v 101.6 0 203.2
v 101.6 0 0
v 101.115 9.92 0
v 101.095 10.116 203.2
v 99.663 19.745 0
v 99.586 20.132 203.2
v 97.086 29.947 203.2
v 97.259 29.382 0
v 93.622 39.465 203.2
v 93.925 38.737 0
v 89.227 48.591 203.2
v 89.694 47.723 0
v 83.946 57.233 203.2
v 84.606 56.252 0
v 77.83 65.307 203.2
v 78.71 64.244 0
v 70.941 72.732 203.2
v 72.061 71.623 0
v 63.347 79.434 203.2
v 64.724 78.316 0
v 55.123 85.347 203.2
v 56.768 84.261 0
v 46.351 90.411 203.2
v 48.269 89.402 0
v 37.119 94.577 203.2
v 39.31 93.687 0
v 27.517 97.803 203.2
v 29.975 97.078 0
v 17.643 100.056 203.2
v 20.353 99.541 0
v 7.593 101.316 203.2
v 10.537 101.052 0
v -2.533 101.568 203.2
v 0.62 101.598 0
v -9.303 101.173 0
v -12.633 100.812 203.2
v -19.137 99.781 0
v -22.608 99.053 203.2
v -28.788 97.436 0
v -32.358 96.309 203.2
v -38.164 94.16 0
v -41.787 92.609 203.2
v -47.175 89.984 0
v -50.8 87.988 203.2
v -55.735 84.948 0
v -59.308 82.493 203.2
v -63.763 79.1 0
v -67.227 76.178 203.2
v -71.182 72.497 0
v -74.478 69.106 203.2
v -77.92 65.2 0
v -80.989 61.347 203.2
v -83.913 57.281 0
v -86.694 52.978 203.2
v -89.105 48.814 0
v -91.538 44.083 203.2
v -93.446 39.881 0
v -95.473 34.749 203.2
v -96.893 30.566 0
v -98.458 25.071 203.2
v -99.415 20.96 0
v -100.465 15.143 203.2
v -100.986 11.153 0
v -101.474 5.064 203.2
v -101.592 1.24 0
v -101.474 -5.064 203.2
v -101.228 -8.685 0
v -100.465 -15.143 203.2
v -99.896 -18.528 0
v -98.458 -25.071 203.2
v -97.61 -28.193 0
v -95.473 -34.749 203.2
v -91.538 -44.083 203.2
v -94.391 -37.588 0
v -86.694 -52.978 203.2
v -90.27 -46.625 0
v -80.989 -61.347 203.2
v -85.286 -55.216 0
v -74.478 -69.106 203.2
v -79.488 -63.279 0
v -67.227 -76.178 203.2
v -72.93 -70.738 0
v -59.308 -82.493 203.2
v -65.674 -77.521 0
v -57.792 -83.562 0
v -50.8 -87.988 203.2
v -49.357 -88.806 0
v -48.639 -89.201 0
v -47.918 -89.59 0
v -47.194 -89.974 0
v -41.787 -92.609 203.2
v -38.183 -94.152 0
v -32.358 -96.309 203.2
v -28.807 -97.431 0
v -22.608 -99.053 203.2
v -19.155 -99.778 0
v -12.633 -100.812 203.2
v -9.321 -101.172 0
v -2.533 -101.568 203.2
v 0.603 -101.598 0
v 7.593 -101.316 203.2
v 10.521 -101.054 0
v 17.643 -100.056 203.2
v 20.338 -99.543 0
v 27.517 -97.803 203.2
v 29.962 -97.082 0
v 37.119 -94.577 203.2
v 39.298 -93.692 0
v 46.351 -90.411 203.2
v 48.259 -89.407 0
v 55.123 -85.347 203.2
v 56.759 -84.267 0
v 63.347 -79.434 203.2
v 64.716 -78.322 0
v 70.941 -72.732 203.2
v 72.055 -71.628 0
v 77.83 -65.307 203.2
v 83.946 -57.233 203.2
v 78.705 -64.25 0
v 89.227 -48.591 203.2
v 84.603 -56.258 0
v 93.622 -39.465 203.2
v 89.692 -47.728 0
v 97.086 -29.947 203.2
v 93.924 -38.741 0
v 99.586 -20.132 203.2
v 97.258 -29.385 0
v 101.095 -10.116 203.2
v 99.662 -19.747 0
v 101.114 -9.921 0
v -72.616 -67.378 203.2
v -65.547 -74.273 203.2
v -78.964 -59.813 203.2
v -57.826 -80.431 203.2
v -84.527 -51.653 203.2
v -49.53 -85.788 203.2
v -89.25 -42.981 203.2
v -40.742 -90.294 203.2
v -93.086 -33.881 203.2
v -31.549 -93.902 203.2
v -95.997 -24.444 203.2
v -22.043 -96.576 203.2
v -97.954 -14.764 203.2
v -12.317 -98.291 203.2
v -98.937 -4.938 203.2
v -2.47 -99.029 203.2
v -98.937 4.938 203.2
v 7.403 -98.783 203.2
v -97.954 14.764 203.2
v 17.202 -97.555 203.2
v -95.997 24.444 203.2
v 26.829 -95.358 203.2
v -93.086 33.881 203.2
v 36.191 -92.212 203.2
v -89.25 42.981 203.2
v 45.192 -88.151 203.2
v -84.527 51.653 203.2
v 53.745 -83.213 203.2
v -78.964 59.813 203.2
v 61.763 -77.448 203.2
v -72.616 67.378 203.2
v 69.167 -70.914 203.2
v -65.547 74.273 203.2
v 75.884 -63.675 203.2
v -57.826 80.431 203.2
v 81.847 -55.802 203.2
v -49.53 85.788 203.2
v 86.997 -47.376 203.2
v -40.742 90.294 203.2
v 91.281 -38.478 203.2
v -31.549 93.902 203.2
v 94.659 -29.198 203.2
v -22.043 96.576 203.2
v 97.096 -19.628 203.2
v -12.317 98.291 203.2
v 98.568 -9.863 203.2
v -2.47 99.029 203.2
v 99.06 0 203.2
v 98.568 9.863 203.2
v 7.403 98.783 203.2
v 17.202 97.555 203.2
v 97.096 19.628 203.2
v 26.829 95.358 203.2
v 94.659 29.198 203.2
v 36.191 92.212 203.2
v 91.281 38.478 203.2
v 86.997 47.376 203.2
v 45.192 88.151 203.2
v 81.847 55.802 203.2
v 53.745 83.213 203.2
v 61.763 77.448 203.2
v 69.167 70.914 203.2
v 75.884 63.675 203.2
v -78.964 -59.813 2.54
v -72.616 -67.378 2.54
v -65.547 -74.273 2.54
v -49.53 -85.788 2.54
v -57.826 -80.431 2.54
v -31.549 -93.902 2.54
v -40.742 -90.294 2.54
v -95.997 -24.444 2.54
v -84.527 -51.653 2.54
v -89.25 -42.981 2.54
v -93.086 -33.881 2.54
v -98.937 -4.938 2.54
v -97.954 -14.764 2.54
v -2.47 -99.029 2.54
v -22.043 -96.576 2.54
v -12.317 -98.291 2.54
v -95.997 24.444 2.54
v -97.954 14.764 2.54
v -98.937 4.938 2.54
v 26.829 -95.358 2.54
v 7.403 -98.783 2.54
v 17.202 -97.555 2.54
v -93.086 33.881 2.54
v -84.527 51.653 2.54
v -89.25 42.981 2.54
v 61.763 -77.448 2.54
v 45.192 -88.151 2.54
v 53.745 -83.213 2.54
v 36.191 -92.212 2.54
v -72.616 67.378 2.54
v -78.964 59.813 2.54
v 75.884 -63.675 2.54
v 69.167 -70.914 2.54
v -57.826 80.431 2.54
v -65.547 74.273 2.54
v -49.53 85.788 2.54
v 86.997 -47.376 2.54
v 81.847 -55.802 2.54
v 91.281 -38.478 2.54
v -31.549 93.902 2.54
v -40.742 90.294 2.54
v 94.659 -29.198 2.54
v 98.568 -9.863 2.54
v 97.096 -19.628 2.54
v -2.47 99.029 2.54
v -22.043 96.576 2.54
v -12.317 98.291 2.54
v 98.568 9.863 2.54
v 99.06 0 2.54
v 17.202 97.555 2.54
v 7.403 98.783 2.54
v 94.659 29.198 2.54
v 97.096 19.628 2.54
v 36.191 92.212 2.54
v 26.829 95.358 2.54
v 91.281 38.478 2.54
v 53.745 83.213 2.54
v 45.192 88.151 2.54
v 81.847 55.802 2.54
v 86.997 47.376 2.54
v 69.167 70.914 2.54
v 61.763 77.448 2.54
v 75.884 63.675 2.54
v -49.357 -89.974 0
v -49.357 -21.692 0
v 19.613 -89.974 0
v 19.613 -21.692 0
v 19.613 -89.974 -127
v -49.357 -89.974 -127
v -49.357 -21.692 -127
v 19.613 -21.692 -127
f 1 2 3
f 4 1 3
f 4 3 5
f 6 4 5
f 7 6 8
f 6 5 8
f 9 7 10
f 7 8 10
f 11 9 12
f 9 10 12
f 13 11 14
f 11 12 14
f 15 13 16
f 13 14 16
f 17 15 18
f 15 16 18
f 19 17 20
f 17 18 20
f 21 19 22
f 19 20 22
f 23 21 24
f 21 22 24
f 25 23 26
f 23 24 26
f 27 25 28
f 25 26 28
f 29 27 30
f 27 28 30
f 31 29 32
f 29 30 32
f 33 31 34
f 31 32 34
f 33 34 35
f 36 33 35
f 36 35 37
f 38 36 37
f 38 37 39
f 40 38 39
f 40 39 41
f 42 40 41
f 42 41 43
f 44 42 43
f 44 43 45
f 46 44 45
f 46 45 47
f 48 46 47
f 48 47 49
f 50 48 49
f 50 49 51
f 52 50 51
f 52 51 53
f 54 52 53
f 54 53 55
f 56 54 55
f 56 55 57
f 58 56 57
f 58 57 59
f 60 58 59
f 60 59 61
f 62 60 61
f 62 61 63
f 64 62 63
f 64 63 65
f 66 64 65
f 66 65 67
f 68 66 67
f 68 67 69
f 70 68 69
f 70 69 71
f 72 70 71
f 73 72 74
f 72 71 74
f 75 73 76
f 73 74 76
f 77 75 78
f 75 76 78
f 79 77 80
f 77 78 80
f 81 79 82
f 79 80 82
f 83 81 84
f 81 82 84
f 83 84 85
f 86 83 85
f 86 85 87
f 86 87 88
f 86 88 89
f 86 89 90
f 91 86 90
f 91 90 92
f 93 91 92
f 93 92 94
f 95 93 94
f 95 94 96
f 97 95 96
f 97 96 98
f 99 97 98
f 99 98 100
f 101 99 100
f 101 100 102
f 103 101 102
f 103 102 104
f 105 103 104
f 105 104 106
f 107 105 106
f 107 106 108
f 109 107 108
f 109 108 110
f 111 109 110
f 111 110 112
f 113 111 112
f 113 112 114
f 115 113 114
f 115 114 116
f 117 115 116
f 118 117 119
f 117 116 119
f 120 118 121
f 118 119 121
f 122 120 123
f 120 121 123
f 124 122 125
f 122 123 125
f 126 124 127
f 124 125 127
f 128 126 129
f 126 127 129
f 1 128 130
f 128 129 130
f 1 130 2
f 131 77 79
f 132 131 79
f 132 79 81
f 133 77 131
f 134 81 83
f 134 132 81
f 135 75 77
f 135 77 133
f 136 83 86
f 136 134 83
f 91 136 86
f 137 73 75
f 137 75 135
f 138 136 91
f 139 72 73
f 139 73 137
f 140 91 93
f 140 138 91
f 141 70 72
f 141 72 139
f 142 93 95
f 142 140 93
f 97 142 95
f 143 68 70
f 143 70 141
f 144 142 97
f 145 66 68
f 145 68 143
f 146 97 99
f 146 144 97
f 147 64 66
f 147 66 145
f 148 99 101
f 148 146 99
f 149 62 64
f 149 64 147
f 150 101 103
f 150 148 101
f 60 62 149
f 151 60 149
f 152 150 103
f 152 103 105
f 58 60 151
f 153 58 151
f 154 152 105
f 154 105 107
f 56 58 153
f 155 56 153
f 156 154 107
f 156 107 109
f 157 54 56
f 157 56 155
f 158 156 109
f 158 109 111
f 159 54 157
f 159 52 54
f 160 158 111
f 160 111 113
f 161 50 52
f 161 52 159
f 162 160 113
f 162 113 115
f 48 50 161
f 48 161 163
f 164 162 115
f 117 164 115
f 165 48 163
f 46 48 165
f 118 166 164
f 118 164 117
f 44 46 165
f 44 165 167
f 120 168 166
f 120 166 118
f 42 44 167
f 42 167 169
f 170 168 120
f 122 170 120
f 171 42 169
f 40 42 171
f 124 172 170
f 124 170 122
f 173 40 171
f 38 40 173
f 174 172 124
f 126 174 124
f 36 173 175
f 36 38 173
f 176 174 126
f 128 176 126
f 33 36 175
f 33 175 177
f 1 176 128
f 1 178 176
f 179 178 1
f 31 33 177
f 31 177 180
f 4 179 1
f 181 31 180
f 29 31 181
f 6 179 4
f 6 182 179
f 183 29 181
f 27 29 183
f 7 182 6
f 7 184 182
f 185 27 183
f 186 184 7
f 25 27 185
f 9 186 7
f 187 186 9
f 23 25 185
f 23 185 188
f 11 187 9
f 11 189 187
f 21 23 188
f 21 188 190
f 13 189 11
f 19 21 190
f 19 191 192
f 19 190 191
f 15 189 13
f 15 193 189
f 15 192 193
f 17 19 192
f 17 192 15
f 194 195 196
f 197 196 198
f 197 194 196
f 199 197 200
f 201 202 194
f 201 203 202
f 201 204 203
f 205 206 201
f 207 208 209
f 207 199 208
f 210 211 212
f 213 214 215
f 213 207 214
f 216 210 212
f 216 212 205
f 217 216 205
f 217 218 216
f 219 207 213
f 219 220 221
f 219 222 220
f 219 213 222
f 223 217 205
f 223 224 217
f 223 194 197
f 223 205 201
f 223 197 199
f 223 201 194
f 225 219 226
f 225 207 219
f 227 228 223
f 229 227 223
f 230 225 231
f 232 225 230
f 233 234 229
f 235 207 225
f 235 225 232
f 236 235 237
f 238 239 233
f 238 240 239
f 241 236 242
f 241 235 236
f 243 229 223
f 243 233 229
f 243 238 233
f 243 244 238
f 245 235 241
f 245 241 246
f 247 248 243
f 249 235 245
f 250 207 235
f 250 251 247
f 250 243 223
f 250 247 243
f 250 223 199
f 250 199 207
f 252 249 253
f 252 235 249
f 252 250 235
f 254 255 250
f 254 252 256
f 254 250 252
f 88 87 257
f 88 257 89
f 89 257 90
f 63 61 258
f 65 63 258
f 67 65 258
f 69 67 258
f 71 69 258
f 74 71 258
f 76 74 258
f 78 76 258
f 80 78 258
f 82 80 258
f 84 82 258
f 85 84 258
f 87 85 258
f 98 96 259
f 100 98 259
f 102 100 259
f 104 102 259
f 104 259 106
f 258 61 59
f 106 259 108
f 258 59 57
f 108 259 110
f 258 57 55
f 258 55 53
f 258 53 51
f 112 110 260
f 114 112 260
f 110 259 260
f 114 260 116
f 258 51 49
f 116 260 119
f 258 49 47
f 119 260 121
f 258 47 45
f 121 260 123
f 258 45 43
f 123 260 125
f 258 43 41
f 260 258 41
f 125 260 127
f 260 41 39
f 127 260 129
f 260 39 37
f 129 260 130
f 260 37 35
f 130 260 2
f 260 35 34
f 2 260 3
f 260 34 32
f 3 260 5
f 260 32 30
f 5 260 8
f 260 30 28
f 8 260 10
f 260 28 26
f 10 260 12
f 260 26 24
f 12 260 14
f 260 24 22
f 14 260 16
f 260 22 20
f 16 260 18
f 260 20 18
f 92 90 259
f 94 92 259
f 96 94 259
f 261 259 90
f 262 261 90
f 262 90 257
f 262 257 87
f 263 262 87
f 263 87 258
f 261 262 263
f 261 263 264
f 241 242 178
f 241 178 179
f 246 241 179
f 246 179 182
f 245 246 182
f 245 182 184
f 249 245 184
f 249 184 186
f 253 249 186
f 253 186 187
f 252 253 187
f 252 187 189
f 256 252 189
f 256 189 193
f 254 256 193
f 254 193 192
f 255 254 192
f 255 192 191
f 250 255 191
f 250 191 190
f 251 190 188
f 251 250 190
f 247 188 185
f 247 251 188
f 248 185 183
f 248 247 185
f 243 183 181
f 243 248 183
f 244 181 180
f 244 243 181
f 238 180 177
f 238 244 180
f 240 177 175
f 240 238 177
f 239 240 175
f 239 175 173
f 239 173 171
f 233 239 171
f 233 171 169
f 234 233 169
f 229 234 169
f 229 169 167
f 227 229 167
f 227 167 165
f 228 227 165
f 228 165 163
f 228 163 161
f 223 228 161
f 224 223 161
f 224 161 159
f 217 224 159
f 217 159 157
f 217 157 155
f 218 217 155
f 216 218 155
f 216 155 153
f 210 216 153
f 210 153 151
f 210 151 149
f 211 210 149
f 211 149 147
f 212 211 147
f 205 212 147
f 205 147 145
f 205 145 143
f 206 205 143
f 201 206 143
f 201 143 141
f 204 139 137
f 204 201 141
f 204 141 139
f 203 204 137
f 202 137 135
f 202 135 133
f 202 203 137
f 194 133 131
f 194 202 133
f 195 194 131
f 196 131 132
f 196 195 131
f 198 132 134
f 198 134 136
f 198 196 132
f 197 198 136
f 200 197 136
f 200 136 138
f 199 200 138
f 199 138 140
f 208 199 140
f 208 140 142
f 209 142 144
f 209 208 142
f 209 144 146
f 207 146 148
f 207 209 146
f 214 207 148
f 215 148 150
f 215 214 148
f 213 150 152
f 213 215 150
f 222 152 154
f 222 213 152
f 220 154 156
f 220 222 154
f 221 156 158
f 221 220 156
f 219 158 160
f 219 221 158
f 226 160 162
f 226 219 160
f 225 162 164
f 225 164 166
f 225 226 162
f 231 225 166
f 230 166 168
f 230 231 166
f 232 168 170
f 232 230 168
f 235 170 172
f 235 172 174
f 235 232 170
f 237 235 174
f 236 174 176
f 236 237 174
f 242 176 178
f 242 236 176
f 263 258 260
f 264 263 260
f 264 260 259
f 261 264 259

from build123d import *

# Parameters (mm, degrees)
F0_R     = 101.6
F1_DEPTH = 203.2
F2_T     = -2.54
F4_DEPTH = 127


with BuildPart() as f1:
    # F0 (on Top) → F1 (new body)
    with BuildSketch(Plane.XY):
        Circle(F0_R)
    extrude(amount=F1_DEPTH)

    # F2
    f2_openings = [f1.faces().sort_by_distance(p)[0] for p in [
        (0, 0, 203.2),
    ]]
    offset(amount=F2_T, openings=f2_openings)

    # F3 (on face) → F4 (join)
    with BuildSketch(Plane(origin=(0, 0, 0), x_dir=(1, 0, 0), z_dir=(0, 0, -1))):
        with BuildLine():
            ThreePointArc((-49.356736, 88.805814), (-48.279072, 89.39626), (-47.194345, 89.973629))
            Line((-47.194345, 89.973629), (-49.356736, 89.973629))
            Line((-49.356736, 89.973629), (-49.356736, 88.805814))
        make_face()
        with BuildLine():
            Line((19.613178, 21.691842), (19.613178, 89.973629))
            Line((19.613178, 89.973629), (-47.194345, 89.973629))
            ThreePointArc((-47.194345, 89.973629), (-48.279072, 89.39626), (-49.356736, 88.805814))
            Line((-49.356736, 88.805814), (-49.356736, 21.691842))
            Line((-49.356736, 21.691842), (19.613178, 21.691842))
        make_face()
    extrude(amount=F4_DEPTH)


solid = f1.part
